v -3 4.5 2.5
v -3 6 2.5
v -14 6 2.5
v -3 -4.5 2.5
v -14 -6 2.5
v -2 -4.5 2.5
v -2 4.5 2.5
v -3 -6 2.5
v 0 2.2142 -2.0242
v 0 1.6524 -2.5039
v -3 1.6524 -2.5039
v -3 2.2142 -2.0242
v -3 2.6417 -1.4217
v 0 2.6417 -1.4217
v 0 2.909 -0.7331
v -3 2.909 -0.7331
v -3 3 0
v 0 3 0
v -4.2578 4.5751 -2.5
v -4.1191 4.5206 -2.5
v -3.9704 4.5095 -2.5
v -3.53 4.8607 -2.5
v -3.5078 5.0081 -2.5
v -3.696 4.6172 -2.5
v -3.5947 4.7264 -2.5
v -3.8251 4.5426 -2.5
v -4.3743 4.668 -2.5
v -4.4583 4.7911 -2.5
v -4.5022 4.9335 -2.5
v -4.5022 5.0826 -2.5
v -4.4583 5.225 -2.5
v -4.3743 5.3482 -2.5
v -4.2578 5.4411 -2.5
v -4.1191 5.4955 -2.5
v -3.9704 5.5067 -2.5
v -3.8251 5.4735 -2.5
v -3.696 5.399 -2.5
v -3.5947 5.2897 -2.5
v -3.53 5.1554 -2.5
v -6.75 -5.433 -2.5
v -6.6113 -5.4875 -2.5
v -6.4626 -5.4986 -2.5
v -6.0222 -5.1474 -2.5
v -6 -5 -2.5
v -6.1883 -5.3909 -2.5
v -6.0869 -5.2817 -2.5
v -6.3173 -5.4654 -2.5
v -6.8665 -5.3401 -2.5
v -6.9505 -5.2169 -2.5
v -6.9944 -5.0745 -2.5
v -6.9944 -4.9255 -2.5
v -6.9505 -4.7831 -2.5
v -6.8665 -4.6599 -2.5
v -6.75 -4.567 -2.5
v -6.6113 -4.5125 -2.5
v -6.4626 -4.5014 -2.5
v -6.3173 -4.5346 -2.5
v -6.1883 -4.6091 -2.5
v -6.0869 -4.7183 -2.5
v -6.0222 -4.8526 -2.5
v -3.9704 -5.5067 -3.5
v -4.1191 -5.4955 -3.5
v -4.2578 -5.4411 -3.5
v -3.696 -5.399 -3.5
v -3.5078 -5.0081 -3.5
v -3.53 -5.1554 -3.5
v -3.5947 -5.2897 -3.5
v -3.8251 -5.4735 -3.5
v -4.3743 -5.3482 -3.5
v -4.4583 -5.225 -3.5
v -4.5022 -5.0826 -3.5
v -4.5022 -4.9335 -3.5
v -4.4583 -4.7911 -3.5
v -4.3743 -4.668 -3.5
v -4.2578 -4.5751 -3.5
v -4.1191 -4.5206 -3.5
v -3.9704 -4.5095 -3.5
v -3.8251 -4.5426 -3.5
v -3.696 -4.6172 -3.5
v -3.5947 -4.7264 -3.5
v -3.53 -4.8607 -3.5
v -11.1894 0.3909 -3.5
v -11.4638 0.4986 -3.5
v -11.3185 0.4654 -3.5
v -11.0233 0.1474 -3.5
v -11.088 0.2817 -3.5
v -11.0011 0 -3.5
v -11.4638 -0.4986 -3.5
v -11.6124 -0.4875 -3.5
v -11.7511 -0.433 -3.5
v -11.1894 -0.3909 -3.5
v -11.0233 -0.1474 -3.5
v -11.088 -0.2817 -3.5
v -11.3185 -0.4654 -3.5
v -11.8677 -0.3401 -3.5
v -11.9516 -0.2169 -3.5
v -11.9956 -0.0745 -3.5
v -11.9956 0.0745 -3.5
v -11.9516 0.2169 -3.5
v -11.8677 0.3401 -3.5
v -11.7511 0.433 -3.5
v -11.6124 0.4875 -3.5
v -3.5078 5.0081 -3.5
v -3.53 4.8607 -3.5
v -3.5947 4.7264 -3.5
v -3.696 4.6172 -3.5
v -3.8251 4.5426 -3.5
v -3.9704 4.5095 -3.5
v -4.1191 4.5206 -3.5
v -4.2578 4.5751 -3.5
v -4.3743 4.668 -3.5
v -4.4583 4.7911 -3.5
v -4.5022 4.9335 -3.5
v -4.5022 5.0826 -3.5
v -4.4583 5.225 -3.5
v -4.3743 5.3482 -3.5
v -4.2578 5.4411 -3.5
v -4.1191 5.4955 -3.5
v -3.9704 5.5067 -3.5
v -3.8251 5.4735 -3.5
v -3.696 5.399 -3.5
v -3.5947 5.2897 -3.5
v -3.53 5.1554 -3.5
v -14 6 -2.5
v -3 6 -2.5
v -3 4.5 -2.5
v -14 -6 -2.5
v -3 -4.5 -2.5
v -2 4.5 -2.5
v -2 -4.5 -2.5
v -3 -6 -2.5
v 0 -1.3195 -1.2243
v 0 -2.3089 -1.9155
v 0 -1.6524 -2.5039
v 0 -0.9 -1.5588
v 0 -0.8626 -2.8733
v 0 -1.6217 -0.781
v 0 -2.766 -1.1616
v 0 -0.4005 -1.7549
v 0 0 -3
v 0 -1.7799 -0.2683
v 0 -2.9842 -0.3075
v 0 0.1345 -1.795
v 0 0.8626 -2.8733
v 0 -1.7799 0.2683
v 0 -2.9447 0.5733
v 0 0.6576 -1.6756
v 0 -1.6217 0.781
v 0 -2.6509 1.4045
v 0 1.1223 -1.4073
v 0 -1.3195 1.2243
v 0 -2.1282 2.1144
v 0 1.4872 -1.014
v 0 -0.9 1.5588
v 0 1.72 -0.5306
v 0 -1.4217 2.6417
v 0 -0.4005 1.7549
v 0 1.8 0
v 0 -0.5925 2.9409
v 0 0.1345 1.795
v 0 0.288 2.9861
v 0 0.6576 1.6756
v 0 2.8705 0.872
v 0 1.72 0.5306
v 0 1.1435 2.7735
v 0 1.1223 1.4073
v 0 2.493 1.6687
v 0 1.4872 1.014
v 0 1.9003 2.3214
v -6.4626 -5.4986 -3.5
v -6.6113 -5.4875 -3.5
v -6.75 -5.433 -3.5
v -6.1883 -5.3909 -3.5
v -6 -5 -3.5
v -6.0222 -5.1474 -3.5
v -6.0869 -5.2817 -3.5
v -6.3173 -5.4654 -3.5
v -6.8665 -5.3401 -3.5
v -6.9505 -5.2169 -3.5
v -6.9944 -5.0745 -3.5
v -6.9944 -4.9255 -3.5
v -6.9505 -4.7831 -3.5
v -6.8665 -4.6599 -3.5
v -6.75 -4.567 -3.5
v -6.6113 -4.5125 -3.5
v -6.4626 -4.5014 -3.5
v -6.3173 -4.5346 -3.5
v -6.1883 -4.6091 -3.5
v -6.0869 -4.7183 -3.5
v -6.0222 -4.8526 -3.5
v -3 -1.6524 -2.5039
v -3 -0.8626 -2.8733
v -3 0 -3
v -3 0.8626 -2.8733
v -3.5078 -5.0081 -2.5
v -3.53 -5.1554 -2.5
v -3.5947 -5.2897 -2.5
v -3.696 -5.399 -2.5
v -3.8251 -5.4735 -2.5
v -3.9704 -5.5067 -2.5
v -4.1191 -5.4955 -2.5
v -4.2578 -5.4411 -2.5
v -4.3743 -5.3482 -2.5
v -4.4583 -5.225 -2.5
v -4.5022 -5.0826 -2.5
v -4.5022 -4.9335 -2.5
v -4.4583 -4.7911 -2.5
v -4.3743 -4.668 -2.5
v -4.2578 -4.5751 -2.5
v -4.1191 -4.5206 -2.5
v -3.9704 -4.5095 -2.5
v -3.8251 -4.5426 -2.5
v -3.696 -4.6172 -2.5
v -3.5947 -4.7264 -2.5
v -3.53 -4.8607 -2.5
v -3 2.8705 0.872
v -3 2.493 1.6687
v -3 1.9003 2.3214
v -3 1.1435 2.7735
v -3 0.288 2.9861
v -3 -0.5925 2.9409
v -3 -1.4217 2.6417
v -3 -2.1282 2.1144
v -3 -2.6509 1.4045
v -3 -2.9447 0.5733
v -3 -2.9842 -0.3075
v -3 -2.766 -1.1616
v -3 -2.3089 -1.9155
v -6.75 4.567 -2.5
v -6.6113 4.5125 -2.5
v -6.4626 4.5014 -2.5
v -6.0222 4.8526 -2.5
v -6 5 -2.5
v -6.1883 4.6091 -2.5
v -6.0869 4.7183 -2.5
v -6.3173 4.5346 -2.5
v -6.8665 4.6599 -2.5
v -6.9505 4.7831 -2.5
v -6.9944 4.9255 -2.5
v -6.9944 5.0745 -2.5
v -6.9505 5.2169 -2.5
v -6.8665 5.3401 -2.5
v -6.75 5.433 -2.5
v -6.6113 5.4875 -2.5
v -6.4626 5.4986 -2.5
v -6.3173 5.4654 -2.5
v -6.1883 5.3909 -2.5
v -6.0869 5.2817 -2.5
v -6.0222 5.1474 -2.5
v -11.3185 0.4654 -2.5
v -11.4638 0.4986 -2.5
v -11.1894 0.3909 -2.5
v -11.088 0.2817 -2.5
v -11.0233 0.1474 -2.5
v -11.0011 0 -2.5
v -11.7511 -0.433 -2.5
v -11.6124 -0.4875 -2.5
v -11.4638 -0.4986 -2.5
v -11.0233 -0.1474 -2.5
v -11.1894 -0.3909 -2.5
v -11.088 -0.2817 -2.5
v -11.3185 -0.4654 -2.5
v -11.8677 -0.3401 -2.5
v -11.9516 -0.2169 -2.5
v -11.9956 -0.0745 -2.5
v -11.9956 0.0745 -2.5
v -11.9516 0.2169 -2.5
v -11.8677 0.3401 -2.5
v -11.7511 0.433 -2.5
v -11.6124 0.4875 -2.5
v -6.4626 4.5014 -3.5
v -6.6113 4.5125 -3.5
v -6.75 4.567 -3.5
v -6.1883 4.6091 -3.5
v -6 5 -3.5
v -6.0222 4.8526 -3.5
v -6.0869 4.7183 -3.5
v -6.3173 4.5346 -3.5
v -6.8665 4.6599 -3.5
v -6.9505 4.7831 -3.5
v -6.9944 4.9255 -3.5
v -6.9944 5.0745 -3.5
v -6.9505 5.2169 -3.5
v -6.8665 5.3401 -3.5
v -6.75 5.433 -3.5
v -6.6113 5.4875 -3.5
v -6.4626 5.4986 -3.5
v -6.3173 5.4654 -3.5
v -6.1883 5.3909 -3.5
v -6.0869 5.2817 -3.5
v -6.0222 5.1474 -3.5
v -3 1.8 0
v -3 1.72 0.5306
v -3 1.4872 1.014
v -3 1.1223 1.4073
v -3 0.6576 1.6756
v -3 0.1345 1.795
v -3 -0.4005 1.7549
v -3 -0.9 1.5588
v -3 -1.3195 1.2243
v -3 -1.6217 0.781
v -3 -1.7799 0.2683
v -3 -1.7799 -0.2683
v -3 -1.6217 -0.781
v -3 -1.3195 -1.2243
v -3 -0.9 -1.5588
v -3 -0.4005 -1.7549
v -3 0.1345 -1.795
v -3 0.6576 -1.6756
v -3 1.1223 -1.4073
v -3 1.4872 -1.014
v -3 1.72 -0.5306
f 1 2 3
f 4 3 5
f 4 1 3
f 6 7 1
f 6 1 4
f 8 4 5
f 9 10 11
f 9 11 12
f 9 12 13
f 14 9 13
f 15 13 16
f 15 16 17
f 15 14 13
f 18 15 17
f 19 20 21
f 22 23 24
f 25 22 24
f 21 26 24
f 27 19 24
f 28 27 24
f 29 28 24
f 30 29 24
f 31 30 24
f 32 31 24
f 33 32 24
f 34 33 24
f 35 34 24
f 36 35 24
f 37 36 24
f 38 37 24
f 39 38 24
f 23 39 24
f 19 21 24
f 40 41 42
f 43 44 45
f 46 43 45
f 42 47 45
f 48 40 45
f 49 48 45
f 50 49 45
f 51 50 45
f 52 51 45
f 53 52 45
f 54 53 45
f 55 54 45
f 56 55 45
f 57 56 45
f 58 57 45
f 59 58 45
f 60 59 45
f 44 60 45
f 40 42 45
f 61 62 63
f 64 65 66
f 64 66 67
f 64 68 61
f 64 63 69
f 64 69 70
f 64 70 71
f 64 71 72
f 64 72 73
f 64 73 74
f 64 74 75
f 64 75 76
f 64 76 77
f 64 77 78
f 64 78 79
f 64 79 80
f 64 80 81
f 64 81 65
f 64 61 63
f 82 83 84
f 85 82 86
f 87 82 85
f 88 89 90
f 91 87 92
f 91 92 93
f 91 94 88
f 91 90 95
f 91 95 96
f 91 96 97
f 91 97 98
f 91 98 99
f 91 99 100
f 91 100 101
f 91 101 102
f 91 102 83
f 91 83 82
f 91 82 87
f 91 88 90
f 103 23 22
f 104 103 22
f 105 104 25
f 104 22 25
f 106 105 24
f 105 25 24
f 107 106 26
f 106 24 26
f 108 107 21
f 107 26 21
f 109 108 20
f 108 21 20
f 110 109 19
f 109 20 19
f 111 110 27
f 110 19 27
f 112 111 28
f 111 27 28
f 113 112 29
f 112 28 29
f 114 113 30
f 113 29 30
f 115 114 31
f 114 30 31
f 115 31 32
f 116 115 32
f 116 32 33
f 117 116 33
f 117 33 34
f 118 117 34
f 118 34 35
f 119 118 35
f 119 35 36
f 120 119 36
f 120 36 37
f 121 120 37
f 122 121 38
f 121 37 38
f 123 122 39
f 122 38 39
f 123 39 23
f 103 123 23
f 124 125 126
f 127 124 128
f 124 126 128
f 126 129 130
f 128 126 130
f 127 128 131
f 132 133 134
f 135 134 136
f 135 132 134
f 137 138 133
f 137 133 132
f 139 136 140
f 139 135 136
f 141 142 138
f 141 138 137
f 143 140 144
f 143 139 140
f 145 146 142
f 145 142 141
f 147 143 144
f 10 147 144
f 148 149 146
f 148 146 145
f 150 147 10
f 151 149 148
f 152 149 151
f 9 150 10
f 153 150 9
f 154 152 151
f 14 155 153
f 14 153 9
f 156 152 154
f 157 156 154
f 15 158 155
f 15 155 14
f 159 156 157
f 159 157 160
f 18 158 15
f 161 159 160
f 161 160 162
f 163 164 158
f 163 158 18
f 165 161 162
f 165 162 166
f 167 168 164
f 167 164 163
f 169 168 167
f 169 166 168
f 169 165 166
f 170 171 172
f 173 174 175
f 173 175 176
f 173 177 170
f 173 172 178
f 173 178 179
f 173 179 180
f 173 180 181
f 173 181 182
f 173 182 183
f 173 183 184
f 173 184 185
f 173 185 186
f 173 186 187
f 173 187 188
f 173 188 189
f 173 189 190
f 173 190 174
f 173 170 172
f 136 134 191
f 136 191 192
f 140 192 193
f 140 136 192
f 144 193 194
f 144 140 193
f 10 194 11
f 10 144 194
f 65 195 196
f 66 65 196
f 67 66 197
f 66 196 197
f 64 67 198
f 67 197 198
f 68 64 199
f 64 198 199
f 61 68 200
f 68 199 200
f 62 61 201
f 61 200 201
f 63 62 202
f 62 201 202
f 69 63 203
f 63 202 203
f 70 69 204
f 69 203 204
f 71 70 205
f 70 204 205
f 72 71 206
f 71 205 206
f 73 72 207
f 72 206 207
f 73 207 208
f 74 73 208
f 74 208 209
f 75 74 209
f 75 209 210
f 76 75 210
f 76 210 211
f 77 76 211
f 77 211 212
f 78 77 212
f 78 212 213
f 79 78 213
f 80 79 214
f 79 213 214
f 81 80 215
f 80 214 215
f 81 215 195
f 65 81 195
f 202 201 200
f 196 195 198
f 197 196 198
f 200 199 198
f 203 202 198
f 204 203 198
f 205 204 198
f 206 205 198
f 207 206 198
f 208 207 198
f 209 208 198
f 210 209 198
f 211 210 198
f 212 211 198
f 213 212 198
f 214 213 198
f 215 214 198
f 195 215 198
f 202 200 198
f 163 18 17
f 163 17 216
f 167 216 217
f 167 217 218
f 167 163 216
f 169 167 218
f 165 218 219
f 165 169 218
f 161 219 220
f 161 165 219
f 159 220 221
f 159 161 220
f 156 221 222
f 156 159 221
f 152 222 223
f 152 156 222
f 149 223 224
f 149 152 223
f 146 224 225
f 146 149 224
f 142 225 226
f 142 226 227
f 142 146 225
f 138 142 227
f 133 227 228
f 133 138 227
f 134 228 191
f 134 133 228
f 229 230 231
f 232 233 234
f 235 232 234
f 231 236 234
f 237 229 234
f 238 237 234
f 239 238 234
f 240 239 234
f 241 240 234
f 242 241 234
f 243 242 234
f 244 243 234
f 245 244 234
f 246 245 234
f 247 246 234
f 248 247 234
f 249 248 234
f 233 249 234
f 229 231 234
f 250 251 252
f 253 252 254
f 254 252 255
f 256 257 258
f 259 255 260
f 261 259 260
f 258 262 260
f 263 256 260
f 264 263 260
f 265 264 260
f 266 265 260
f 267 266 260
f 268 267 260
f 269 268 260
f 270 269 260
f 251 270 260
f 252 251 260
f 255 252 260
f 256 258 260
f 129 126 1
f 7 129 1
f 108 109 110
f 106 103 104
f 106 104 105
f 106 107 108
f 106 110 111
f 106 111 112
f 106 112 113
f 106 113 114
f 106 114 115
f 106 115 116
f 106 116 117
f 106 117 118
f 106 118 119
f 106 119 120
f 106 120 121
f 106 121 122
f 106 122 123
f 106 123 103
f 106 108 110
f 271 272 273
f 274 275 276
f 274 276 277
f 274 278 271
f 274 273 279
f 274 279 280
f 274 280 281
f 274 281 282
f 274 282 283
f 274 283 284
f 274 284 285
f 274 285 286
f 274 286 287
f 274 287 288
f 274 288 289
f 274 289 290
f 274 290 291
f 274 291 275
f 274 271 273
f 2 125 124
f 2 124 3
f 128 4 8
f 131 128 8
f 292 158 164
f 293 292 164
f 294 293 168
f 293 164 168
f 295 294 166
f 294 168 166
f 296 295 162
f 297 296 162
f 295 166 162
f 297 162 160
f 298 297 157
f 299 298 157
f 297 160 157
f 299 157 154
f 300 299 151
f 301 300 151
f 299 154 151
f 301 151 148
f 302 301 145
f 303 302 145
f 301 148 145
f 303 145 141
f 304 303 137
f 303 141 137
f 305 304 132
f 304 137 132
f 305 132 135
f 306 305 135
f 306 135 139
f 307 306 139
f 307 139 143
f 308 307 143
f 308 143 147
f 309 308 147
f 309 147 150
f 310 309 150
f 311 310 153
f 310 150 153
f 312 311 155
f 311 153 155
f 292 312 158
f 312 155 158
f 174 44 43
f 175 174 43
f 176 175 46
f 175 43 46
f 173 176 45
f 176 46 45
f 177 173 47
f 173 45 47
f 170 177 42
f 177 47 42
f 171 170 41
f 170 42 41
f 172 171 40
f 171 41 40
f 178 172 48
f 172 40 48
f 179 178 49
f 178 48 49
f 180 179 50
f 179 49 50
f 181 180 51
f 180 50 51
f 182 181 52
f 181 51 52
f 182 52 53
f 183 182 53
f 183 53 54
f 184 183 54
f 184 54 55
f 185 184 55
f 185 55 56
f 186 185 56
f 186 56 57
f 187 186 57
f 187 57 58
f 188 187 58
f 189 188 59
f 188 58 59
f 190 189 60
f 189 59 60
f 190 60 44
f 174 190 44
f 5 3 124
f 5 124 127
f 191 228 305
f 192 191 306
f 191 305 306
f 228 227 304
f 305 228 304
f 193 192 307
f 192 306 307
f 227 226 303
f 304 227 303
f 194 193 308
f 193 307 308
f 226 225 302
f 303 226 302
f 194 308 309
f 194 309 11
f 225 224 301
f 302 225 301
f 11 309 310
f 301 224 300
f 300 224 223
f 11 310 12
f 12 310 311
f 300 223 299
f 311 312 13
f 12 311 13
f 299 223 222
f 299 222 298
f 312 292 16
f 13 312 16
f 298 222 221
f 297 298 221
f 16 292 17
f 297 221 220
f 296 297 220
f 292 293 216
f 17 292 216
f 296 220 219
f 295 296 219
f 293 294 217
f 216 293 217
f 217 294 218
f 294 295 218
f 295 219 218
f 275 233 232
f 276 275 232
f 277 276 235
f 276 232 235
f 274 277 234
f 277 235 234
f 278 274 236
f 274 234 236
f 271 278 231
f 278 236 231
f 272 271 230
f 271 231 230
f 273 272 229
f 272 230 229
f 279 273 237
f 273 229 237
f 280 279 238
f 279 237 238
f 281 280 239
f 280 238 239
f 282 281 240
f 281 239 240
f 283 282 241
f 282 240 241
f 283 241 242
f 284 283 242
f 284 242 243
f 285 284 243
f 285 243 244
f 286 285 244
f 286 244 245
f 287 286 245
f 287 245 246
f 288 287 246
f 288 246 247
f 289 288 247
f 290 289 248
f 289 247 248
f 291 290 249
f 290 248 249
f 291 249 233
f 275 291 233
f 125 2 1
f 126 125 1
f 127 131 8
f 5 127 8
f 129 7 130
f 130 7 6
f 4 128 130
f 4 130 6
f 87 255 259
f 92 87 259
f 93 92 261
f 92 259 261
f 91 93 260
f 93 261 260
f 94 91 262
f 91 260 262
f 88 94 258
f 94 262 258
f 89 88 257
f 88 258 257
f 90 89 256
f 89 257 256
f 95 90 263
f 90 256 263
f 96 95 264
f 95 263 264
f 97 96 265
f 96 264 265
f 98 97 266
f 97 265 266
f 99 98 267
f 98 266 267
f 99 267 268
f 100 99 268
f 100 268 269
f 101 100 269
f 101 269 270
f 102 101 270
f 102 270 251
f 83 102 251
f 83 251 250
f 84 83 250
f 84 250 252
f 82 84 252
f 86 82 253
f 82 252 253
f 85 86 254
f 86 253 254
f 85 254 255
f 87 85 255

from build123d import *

# Parameters (mm, degrees)
F0_R     = 1.8
F1_DEPTH = 3
F2_W     = 9
F2_H     = 5
F3_DEPTH = 1
F4_W     = 12
F4_H     = 5
F5_DEPTH = 11
F6_R     = 0.5
F7_DEPTH = 1


# Not quite as in the source:
# - a feature names something its author has since deleted; it is built from what else it names


with BuildPart() as f1:
    # F0 (on Right) → F1 (new body)
    with BuildSketch(Plane.YZ):
        with BuildLine():
            ThreePointArc((1.6524272508, -2.5038938038), (2.6417117322, -1.421745098), (3, 0))
            ThreePointArc((3, 0), (-1.421745098, 2.6417117322), (-1.6524272508, -2.5038938038))
            Line((-1.6524272508, -2.5038938038), (1.6524272508, -2.5038938038))
        make_face()
        Circle(F0_R, mode=Mode.SUBTRACT)
        with BuildLine():
            Line((1.6524272508, -2.5038938038), (-1.6524272508, -2.5038938038))
            ThreePointArc((-1.6524272508, -2.5038938038), (0, -3), (1.6524272508, -2.5038938038))
        make_face()
    extrude(amount=-F1_DEPTH)


with BuildPart() as f3:
    # F2 (on face) → F3 (new body)
    with BuildSketch(Plane(origin=(-3, 0, 0), x_dir=(0, -1, 0), z_dir=(-1, 0, 0))):
        Rectangle(F2_W, F2_H)
    extrude(amount=-F3_DEPTH)

    # F4 (on face) → F5 (join)
    with BuildSketch(Plane(origin=(-3, 0, 0), x_dir=(0, -1, 0), z_dir=(-1, 0, 0))):
        Rectangle(F4_W, F4_H)
    extrude(amount=F5_DEPTH)


with BuildPart() as f7:
    # F6 (on face) → F7 (new body)
    with BuildSketch(Plane(origin=(0, 0, -2.5), x_dir=(1, 0, 0), z_dir=(0, 0, -1))):
        with Locations((-4.0077906769, 5.0080687183)):
            Circle(F6_R)
    extrude(amount=F7_DEPTH)


with BuildPart() as f7b:
    # F6 (on face) → F7, piece 2 (new body)
    with BuildSketch(Plane(origin=(0, 0, -2.5), x_dir=(1, 0, 0), z_dir=(0, 0, -1))):
        with Locations((-11.5011356074, 0)):
            Circle(F6_R)
    extrude(amount=F7_DEPTH)


with BuildPart() as f7c:
    # F6 (on face) → F7, piece 3 (new body)
    with BuildSketch(Plane(origin=(0, 0, -2.5), x_dir=(1, 0, 0), z_dir=(0, 0, -1))):
        with Locations((-6.5, -5)):
            Circle(F6_R)
    extrude(amount=F7_DEPTH)


with BuildPart() as f7d:
    # F6 (on face) → F7, piece 4 (new body)
    with BuildSketch(Plane(origin=(0, 0, -2.5), x_dir=(1, 0, 0), z_dir=(0, 0, -1))):
        with Locations((-6.5, 5)):
            Circle(F6_R)
    extrude(amount=F7_DEPTH)


with BuildPart() as f7e:
    # F6 (on face) → F7, piece 5 (new body)
    with BuildSketch(Plane(origin=(0, 0, -2.5), x_dir=(1, 0, 0), z_dir=(0, 0, -1))):
        with Locations((-4.0077906769, -5.0080687183)):
            Circle(F6_R)
    extrude(amount=F7_DEPTH)


solid = Compound([f1.part, f3.part, f7.part, f7b.part, f7c.part, f7d.part, f7e.part])
